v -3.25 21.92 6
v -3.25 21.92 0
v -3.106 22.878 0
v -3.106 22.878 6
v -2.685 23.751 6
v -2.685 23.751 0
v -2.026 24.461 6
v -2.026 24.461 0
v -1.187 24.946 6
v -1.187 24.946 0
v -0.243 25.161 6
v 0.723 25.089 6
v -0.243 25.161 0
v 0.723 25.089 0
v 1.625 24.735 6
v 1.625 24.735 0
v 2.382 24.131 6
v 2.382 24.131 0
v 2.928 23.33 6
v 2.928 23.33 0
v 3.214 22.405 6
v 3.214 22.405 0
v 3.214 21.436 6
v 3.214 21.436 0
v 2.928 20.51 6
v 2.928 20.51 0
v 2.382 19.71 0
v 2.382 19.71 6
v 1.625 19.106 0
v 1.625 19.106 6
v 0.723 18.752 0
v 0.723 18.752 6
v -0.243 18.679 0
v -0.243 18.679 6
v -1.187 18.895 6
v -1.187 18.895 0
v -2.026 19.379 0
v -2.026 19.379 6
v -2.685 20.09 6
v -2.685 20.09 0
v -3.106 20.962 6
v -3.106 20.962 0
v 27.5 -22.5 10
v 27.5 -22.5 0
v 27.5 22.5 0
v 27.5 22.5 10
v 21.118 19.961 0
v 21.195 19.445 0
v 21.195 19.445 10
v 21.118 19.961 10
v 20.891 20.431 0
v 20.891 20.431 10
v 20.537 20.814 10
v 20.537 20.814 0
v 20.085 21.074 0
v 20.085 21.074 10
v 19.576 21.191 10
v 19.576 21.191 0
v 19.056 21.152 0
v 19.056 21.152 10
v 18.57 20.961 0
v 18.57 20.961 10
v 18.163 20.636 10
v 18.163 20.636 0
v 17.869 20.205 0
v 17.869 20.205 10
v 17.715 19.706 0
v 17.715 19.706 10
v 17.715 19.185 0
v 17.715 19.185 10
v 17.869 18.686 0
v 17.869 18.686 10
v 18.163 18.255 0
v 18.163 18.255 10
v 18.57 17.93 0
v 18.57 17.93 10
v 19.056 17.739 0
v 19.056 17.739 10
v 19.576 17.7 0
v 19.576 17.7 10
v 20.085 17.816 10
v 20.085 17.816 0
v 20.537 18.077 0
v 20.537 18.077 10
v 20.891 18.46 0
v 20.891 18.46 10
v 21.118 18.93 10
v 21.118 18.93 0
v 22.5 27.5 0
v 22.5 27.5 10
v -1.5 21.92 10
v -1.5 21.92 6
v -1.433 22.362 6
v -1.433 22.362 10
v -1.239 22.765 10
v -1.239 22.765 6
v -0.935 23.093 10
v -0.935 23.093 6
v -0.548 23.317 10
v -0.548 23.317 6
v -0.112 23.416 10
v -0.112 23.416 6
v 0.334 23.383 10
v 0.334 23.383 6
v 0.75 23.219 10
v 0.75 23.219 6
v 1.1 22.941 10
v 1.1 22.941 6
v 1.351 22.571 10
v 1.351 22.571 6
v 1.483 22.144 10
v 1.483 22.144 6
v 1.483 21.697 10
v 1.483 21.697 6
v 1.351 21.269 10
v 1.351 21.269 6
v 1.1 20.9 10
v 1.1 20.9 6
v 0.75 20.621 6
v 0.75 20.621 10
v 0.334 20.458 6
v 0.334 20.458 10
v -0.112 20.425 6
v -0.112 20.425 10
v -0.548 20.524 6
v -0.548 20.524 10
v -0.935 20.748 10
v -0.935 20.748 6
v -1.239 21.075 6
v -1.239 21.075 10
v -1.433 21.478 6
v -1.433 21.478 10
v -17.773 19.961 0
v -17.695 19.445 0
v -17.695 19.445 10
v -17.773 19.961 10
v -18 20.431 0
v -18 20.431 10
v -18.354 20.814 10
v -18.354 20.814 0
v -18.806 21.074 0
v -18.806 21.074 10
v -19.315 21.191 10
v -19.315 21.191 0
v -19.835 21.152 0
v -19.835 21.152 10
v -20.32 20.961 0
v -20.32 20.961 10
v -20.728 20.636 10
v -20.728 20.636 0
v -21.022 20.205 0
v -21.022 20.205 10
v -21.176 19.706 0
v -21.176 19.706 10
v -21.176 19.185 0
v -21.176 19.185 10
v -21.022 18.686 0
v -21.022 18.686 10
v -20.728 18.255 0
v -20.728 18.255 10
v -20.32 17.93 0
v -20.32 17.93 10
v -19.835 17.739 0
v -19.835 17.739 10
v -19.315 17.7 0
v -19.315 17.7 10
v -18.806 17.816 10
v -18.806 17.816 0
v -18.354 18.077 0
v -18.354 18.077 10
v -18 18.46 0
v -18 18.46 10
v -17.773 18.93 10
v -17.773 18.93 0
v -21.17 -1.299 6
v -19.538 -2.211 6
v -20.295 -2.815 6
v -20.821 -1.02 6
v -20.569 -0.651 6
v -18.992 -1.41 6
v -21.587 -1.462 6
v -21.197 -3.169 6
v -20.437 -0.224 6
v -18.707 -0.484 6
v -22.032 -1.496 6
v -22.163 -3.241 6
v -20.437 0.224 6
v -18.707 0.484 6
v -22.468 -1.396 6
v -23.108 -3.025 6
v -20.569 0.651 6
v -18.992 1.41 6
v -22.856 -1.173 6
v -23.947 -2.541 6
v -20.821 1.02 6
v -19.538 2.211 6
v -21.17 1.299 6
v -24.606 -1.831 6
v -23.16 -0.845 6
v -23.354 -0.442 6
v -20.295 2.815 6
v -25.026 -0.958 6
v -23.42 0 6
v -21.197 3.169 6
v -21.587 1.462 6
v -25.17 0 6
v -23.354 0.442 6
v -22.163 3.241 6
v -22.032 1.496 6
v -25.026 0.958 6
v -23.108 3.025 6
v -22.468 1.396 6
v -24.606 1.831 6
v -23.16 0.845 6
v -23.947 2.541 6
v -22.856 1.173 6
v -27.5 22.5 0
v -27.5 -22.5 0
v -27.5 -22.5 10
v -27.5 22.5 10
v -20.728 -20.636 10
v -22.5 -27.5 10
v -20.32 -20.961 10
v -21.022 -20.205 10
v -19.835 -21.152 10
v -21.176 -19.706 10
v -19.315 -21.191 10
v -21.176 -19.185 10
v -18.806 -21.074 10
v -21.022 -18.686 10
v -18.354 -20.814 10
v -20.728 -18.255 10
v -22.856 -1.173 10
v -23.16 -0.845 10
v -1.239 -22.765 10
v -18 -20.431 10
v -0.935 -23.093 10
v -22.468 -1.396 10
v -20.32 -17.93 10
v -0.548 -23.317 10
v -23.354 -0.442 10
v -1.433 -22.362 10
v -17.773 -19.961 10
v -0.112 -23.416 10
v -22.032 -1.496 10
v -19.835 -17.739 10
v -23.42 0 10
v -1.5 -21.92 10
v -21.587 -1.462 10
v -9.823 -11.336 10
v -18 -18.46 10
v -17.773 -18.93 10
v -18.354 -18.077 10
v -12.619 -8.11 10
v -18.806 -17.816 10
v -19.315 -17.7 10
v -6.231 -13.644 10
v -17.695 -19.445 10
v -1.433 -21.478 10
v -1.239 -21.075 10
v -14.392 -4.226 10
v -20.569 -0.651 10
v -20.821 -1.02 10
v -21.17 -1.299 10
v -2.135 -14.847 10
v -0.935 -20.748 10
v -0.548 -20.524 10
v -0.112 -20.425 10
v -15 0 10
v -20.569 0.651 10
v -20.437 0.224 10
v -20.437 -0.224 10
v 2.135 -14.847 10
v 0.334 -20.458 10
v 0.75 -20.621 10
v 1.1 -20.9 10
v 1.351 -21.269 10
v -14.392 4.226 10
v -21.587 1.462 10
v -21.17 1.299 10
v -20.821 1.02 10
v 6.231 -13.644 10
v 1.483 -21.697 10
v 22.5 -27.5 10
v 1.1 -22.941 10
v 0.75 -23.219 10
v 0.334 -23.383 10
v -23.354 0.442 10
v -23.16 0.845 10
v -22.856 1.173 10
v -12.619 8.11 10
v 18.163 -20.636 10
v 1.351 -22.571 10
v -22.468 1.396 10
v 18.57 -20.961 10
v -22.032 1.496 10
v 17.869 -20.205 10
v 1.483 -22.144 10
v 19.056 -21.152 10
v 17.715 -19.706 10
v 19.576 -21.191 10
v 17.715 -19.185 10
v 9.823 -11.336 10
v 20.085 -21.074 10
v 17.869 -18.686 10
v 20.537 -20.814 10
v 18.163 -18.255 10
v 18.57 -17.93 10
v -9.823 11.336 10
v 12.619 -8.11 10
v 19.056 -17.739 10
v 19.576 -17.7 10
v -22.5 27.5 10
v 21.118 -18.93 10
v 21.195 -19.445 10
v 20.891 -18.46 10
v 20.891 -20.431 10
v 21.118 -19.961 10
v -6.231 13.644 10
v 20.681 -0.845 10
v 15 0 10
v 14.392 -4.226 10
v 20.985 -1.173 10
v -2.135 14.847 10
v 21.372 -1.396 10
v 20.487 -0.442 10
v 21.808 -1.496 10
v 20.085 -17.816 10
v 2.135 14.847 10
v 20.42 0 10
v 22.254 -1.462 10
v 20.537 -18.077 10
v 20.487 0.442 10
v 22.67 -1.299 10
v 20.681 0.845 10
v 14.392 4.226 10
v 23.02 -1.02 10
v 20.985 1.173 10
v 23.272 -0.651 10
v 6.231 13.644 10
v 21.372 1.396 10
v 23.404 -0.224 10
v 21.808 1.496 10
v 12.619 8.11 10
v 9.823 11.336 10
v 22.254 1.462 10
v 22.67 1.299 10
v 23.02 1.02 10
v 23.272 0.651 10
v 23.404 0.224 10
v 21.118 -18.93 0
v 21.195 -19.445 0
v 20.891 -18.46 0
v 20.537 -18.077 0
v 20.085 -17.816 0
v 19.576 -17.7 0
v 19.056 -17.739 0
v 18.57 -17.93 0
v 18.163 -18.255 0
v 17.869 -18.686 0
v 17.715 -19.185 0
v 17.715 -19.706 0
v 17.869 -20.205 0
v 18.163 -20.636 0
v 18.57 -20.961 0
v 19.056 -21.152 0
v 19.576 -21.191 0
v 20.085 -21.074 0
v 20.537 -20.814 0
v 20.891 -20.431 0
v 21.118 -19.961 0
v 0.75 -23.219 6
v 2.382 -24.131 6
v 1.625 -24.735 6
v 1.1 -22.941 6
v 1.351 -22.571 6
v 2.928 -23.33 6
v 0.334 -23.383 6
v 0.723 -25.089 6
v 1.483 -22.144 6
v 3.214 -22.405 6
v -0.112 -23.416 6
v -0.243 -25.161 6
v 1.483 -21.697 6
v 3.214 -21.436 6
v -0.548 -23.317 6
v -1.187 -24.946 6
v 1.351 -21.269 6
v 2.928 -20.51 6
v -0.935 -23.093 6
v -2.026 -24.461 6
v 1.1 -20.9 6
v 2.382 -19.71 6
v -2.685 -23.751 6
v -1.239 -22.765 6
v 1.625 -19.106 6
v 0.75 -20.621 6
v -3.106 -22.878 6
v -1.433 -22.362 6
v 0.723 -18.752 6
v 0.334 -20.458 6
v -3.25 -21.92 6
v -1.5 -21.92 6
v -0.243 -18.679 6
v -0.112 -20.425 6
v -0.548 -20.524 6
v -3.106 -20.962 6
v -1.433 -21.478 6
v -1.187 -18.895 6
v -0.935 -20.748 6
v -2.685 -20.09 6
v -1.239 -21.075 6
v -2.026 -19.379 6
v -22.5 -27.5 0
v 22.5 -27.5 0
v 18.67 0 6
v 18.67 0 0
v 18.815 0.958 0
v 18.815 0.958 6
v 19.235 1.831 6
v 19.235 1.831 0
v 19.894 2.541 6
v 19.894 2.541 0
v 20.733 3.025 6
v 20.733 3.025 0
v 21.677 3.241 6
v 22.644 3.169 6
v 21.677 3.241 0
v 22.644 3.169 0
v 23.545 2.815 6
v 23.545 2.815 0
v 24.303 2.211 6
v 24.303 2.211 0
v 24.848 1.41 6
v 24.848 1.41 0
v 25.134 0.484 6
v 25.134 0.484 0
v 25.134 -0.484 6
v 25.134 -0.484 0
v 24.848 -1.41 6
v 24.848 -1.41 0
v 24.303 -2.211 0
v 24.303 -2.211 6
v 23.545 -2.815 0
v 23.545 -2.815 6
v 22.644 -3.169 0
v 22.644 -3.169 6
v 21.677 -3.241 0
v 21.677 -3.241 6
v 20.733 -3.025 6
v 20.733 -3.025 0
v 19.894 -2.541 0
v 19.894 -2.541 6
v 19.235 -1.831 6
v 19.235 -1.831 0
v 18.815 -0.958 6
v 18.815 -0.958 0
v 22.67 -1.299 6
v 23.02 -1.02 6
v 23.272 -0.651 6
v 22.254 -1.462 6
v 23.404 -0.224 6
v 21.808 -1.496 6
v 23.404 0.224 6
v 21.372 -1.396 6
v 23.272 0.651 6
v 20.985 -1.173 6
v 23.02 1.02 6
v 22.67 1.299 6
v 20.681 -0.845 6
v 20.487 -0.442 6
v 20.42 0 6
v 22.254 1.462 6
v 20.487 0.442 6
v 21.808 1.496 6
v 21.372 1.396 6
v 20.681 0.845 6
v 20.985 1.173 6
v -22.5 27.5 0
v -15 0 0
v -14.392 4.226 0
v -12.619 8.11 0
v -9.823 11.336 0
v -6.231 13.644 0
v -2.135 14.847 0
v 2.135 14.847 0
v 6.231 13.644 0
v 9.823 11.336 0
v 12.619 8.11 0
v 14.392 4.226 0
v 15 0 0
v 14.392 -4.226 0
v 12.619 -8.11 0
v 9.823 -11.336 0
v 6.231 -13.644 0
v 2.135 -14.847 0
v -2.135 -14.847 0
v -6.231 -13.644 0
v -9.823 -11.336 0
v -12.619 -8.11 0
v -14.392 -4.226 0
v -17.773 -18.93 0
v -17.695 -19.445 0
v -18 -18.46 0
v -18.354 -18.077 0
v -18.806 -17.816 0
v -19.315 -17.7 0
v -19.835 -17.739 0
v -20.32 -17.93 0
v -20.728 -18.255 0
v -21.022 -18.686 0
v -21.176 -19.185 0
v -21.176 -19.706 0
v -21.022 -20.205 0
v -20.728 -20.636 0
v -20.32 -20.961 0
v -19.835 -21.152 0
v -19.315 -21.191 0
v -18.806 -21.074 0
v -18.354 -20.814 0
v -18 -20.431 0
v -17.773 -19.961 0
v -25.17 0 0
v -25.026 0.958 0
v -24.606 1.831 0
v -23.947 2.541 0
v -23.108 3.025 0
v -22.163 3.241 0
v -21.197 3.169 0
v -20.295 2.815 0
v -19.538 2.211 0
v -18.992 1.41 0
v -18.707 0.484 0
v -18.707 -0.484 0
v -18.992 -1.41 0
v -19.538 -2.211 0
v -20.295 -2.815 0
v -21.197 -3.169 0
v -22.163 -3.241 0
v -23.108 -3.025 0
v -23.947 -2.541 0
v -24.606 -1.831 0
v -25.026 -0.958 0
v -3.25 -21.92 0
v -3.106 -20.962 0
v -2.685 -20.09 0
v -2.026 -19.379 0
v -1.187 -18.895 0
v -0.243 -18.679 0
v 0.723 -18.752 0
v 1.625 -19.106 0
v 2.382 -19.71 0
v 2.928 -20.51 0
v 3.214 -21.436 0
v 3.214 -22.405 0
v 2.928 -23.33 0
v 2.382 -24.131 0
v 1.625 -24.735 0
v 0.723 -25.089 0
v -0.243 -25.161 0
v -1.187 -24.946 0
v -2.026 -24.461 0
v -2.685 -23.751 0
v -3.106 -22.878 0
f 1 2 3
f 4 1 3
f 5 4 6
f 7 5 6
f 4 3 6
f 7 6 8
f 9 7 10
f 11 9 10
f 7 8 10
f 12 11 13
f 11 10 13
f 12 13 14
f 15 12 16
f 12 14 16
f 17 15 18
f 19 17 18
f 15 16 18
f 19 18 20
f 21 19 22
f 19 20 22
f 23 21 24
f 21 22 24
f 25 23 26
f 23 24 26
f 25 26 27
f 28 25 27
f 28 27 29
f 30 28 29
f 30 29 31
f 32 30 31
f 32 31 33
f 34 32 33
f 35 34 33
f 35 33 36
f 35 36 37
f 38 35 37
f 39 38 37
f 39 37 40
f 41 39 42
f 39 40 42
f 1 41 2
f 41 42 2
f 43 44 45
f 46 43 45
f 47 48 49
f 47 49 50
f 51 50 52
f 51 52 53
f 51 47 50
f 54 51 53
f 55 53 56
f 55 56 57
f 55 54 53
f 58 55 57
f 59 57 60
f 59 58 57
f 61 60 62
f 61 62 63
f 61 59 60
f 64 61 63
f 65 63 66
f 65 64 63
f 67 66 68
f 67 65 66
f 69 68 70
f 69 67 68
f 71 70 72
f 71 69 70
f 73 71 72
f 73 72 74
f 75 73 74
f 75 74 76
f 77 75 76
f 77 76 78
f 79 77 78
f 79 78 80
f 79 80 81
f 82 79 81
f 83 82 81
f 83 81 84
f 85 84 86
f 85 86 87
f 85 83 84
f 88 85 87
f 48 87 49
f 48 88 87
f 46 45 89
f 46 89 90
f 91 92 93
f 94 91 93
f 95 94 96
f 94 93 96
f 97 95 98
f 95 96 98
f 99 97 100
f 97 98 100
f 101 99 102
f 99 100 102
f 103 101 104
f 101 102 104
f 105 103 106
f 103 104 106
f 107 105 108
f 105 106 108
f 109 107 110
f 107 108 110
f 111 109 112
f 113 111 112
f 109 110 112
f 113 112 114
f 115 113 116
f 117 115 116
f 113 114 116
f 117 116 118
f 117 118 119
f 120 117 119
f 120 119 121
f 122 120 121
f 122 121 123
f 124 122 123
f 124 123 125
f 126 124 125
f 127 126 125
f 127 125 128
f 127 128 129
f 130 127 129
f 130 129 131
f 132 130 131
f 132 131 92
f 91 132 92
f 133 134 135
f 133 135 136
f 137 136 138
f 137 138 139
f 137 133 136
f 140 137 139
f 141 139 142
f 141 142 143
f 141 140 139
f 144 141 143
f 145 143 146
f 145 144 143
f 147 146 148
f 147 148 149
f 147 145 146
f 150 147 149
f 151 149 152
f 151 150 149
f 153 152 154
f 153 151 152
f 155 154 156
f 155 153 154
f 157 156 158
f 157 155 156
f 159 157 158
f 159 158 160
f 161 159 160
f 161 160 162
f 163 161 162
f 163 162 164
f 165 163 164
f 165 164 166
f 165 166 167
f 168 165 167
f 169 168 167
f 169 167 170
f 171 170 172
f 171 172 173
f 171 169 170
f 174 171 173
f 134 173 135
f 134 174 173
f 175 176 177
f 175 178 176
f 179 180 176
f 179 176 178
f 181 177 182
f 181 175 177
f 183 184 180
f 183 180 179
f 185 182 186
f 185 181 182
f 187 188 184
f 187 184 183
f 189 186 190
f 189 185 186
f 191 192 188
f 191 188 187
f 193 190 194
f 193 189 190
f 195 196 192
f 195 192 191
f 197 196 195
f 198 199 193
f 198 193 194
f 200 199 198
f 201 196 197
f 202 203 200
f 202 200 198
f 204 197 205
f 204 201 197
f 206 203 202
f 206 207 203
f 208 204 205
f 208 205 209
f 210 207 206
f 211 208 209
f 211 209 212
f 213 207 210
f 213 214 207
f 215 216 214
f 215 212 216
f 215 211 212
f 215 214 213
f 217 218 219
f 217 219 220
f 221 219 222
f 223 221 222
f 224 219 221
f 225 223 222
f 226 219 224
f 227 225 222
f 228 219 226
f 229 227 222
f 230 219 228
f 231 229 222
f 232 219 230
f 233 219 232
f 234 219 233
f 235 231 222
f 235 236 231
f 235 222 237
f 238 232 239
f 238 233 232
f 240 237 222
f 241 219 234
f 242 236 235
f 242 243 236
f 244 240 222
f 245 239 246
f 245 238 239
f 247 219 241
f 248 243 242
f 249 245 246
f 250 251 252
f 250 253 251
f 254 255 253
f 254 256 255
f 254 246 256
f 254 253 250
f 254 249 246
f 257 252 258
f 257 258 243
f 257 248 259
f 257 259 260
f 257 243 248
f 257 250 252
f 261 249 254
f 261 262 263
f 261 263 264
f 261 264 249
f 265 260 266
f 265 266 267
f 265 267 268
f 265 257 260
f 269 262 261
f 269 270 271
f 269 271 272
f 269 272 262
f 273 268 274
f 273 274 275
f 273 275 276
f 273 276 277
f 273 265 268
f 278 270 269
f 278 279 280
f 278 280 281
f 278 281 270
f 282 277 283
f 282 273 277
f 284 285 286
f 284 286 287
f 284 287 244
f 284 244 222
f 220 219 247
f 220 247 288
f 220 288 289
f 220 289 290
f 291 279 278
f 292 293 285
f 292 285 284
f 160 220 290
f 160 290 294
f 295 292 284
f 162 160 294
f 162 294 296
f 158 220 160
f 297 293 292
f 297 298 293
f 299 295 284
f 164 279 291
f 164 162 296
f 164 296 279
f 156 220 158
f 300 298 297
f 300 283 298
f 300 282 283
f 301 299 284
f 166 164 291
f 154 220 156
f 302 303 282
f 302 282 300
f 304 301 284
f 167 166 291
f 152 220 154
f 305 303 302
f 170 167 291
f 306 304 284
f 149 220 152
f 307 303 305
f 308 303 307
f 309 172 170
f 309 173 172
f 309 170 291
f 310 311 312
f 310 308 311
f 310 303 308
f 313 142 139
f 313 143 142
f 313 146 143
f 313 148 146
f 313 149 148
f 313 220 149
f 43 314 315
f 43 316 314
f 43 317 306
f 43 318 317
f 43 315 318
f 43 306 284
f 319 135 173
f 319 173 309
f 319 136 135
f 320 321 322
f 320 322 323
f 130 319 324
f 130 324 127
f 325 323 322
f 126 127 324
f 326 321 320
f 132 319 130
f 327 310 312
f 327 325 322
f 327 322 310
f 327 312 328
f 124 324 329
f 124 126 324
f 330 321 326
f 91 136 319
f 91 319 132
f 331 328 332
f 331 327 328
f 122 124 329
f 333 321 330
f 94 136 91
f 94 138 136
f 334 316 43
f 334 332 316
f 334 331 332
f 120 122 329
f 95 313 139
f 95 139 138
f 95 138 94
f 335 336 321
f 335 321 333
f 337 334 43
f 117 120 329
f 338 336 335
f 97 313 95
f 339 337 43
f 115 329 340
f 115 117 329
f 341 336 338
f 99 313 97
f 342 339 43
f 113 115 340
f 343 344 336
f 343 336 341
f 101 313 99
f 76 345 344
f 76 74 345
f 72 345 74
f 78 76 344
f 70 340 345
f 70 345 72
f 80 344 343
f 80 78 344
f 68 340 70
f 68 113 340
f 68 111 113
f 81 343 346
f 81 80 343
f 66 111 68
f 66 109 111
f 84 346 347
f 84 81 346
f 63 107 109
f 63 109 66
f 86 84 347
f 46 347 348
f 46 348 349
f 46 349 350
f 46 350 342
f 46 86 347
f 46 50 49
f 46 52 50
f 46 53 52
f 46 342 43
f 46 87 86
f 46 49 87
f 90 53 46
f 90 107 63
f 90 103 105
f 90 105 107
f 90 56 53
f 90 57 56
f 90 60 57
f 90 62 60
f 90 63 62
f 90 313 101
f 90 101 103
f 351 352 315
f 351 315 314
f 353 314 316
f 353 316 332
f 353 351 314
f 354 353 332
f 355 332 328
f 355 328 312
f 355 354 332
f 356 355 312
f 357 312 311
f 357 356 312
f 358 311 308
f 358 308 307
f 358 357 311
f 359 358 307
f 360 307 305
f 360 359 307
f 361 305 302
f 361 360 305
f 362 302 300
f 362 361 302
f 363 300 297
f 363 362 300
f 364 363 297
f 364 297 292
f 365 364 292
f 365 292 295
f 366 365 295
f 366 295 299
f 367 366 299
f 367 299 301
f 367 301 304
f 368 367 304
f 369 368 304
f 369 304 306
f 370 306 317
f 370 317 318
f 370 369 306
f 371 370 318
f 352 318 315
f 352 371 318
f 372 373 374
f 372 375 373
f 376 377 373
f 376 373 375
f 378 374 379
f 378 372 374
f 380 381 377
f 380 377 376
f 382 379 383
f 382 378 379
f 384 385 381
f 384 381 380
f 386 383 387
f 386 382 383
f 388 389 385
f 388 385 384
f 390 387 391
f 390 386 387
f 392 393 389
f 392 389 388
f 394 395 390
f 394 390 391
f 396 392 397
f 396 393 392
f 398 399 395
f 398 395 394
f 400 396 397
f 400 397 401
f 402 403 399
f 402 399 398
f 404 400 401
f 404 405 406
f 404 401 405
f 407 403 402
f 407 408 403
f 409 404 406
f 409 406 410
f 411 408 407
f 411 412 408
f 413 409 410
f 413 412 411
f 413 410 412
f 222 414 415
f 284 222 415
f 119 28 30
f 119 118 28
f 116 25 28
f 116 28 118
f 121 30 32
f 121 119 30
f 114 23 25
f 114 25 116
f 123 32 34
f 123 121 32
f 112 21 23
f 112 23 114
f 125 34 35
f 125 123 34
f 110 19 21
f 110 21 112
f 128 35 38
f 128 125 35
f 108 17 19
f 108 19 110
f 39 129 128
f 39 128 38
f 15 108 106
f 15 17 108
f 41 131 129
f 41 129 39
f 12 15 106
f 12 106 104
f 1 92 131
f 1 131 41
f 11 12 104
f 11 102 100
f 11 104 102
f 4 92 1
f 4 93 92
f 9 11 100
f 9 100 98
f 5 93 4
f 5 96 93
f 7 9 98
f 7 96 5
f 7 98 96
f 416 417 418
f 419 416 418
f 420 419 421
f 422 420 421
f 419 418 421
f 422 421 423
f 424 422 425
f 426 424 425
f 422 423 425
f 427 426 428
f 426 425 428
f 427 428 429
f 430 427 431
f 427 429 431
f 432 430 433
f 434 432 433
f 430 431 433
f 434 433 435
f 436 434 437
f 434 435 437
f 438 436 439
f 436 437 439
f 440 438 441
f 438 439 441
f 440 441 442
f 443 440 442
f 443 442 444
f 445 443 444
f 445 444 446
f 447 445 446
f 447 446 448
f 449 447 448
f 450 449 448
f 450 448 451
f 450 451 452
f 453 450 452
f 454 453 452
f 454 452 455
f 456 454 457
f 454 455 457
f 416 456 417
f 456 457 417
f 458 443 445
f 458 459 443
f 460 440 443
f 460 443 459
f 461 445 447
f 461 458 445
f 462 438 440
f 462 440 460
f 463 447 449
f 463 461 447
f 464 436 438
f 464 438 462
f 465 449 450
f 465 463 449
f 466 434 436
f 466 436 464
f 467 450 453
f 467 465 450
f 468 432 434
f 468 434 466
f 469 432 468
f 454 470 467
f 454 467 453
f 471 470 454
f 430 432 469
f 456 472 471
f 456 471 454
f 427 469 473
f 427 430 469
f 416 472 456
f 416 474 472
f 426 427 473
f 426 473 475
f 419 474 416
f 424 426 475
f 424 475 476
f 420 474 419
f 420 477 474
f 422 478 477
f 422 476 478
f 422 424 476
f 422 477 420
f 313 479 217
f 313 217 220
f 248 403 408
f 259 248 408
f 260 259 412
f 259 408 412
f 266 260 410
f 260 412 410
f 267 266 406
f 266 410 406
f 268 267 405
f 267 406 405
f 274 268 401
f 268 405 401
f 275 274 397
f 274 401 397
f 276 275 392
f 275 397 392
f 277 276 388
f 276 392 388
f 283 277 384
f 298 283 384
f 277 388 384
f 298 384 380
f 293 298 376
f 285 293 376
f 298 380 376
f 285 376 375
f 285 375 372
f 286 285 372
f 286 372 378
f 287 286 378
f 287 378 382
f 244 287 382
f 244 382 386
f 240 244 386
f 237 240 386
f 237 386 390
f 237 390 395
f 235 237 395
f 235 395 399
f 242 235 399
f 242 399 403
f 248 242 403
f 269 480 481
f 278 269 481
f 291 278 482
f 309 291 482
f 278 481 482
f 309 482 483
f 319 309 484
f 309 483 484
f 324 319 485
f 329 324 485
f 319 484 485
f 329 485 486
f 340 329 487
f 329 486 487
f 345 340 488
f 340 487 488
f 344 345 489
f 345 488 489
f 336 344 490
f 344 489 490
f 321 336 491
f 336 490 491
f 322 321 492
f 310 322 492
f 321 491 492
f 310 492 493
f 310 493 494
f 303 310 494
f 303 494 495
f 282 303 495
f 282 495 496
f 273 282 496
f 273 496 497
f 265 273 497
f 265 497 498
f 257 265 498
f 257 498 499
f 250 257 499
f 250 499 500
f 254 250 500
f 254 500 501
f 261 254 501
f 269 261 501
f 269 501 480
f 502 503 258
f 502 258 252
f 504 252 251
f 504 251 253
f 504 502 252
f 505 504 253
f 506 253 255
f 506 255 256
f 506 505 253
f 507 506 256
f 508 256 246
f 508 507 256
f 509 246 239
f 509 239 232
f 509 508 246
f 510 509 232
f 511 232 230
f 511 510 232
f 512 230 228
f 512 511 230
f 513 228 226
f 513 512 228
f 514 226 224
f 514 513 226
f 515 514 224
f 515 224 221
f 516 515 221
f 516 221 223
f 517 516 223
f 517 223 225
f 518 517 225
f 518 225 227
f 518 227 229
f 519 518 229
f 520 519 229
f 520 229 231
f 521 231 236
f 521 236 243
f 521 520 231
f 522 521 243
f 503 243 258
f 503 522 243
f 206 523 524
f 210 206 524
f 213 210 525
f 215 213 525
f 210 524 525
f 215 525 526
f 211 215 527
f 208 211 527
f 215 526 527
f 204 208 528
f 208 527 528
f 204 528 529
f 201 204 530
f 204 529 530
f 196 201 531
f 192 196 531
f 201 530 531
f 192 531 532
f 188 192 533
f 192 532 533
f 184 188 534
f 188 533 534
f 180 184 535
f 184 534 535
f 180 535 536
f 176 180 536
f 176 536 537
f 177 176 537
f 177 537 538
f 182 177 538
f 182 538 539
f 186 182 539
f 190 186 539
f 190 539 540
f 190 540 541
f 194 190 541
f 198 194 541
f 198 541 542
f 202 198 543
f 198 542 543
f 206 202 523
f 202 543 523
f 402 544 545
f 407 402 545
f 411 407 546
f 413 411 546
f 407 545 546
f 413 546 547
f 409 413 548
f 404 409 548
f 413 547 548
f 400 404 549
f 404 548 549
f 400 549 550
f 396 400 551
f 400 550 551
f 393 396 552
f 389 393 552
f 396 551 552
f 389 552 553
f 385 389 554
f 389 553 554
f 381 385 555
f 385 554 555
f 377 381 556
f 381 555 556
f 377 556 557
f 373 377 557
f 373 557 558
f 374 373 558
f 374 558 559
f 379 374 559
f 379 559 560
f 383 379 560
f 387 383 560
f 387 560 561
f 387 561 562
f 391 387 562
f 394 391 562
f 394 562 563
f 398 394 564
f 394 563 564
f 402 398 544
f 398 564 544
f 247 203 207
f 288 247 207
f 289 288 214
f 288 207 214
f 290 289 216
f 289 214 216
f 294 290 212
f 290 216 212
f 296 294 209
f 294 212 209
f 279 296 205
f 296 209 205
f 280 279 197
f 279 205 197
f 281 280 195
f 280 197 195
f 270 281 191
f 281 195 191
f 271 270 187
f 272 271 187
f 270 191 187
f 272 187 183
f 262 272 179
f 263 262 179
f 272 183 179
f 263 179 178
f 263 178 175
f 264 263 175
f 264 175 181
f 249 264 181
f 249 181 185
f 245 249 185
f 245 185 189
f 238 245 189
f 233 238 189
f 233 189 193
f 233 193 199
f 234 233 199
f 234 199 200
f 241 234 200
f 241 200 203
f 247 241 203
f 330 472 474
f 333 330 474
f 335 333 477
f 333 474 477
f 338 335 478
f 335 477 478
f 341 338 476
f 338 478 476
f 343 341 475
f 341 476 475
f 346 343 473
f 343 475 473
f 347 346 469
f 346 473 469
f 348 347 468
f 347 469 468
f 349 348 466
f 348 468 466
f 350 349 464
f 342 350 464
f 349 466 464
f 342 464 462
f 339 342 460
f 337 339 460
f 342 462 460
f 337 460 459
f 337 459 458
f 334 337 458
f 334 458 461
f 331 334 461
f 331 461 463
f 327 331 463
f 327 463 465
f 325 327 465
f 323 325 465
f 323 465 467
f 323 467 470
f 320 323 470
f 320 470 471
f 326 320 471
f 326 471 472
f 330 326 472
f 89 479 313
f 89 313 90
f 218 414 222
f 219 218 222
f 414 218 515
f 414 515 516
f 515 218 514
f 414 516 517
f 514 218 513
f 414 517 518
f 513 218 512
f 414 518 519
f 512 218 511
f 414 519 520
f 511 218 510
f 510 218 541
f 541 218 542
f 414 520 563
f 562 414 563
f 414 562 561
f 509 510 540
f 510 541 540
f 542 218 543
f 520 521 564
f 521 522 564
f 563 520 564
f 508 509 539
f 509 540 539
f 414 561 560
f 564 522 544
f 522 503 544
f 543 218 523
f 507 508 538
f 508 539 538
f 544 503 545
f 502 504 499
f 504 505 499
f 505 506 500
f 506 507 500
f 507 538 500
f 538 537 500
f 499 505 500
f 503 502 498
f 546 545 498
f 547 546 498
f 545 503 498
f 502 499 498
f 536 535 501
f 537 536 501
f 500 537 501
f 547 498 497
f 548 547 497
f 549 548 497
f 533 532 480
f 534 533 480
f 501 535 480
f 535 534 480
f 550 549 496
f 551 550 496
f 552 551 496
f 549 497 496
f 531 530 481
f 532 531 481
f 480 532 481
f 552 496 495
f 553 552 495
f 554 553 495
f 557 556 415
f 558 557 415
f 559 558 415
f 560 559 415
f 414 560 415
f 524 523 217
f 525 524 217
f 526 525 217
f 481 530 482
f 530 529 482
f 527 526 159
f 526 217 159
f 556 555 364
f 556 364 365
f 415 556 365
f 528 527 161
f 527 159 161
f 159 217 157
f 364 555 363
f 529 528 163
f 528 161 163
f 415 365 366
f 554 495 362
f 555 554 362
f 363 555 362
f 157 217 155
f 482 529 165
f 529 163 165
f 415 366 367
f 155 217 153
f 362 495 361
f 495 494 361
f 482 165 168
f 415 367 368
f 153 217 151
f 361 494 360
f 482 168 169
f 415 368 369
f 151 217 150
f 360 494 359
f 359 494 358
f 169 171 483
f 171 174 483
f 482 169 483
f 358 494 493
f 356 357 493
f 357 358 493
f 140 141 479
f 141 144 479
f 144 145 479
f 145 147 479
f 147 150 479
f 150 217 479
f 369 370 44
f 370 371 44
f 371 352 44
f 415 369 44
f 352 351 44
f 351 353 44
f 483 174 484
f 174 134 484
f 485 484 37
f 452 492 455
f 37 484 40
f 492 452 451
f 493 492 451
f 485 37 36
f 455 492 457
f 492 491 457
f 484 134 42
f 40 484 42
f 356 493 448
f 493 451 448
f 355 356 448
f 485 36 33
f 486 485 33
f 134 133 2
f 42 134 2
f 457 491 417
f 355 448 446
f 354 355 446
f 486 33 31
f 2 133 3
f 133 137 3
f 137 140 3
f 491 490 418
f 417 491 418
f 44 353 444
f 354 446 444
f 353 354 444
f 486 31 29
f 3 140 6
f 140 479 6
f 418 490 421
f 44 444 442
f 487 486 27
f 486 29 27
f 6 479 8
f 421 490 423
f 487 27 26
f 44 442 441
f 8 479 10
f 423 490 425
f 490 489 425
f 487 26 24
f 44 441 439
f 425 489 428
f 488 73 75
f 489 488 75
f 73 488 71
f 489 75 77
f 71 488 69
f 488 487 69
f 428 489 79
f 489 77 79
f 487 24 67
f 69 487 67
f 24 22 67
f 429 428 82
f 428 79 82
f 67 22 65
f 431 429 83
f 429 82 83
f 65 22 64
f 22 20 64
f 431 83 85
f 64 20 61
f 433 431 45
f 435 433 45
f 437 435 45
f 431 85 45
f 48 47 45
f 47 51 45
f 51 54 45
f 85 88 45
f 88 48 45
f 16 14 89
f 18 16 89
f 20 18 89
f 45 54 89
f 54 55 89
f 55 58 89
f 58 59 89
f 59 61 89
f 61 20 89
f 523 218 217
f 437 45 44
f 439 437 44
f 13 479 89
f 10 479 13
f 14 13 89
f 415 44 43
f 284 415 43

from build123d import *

# Parameters (mm, degrees)
SKETCH1_W           = 55
SKETCH1_H           = 55
SKETCH1_R           = 1.75
BOSS_EXTRUDE1_DEPTH = 10
SKETCH2_R           = 15
CUT_EXTRUDE1_DEPTH  = 41.155946011
SKETCH3_R           = 1.5
CUT_EXTRUDE2_DEPTH  = 41.155946011
SKETCH4_R           = 3.25
CUT_EXTRUDE3_DEPTH  = 6
CHAMFER1_SIZE       = 5


with BuildPart() as part:
    # Sketch1 → Boss-Extrude1 (new body)
    with BuildSketch(Plane.XY):
        Rectangle(SKETCH1_W, SKETCH1_H)
        with Locations((19.445436483, 19.445436483)):
            Circle(SKETCH1_R, mode=Mode.SUBTRACT)
        with Locations((-19.445436483, 19.445436483)):
            Circle(SKETCH1_R, mode=Mode.SUBTRACT)
        with Locations((-19.445436483, -19.445436483)):
            Circle(SKETCH1_R, mode=Mode.SUBTRACT)
        with Locations((19.445436483, -19.445436483)):
            Circle(SKETCH1_R, mode=Mode.SUBTRACT)
    extrude(amount=BOSS_EXTRUDE1_DEPTH)

    # Sketch2 → Cut-Extrude1 (cut, through all)
    with BuildSketch(Plane(origin=(0, 0, 0), x_dir=(-1, 0, 0), z_dir=(0, 0, -1))):
        Circle(SKETCH2_R)
    extrude(amount=-CUT_EXTRUDE1_DEPTH, mode=Mode.SUBTRACT)

    # Sketch3 → Cut-Extrude2 (cut, through all)
    with BuildSketch(Plane(origin=(0, 0, 0), x_dir=(-1, 0, 0), z_dir=(0, 0, -1))):
        with Locations((0, 21.920310217)):
            Circle(SKETCH3_R)
        with Locations((21.920310217, 0)):
            Circle(SKETCH3_R)
        with Locations((0, -21.920310217)):
            Circle(SKETCH3_R)
        with Locations((-21.920310217, 0)):
            Circle(SKETCH3_R)
    extrude(amount=-CUT_EXTRUDE2_DEPTH, mode=Mode.SUBTRACT)

    # Sketch4 → Cut-Extrude3 (cut)
    with BuildSketch(Plane(origin=(0, 0, 0), x_dir=(-1, 0, 0), z_dir=(0, 0, -1))):
        with Locations((0, 21.920310217)):
            Circle(SKETCH4_R)
        with Locations((21.920310217, 0)):
            Circle(SKETCH4_R)
        with Locations((0, -21.920310217)):
            Circle(SKETCH4_R)
        with Locations((-21.920310217, 0)):
            Circle(SKETCH4_R)
    extrude(amount=-CUT_EXTRUDE3_DEPTH, mode=Mode.SUBTRACT)

    # Chamfer1
    chamfer1_edges = [part.edges().sort_by_distance(p)[0] for p in [
        (27.5, -27.5, 5),
        (-27.5, -27.5, 5),
        (-27.5, 27.5, 5),
        (27.5, 27.5, 5),
    ]]
    chamfer(chamfer1_edges, length=CHAMFER1_SIZE)


solid = part.part
